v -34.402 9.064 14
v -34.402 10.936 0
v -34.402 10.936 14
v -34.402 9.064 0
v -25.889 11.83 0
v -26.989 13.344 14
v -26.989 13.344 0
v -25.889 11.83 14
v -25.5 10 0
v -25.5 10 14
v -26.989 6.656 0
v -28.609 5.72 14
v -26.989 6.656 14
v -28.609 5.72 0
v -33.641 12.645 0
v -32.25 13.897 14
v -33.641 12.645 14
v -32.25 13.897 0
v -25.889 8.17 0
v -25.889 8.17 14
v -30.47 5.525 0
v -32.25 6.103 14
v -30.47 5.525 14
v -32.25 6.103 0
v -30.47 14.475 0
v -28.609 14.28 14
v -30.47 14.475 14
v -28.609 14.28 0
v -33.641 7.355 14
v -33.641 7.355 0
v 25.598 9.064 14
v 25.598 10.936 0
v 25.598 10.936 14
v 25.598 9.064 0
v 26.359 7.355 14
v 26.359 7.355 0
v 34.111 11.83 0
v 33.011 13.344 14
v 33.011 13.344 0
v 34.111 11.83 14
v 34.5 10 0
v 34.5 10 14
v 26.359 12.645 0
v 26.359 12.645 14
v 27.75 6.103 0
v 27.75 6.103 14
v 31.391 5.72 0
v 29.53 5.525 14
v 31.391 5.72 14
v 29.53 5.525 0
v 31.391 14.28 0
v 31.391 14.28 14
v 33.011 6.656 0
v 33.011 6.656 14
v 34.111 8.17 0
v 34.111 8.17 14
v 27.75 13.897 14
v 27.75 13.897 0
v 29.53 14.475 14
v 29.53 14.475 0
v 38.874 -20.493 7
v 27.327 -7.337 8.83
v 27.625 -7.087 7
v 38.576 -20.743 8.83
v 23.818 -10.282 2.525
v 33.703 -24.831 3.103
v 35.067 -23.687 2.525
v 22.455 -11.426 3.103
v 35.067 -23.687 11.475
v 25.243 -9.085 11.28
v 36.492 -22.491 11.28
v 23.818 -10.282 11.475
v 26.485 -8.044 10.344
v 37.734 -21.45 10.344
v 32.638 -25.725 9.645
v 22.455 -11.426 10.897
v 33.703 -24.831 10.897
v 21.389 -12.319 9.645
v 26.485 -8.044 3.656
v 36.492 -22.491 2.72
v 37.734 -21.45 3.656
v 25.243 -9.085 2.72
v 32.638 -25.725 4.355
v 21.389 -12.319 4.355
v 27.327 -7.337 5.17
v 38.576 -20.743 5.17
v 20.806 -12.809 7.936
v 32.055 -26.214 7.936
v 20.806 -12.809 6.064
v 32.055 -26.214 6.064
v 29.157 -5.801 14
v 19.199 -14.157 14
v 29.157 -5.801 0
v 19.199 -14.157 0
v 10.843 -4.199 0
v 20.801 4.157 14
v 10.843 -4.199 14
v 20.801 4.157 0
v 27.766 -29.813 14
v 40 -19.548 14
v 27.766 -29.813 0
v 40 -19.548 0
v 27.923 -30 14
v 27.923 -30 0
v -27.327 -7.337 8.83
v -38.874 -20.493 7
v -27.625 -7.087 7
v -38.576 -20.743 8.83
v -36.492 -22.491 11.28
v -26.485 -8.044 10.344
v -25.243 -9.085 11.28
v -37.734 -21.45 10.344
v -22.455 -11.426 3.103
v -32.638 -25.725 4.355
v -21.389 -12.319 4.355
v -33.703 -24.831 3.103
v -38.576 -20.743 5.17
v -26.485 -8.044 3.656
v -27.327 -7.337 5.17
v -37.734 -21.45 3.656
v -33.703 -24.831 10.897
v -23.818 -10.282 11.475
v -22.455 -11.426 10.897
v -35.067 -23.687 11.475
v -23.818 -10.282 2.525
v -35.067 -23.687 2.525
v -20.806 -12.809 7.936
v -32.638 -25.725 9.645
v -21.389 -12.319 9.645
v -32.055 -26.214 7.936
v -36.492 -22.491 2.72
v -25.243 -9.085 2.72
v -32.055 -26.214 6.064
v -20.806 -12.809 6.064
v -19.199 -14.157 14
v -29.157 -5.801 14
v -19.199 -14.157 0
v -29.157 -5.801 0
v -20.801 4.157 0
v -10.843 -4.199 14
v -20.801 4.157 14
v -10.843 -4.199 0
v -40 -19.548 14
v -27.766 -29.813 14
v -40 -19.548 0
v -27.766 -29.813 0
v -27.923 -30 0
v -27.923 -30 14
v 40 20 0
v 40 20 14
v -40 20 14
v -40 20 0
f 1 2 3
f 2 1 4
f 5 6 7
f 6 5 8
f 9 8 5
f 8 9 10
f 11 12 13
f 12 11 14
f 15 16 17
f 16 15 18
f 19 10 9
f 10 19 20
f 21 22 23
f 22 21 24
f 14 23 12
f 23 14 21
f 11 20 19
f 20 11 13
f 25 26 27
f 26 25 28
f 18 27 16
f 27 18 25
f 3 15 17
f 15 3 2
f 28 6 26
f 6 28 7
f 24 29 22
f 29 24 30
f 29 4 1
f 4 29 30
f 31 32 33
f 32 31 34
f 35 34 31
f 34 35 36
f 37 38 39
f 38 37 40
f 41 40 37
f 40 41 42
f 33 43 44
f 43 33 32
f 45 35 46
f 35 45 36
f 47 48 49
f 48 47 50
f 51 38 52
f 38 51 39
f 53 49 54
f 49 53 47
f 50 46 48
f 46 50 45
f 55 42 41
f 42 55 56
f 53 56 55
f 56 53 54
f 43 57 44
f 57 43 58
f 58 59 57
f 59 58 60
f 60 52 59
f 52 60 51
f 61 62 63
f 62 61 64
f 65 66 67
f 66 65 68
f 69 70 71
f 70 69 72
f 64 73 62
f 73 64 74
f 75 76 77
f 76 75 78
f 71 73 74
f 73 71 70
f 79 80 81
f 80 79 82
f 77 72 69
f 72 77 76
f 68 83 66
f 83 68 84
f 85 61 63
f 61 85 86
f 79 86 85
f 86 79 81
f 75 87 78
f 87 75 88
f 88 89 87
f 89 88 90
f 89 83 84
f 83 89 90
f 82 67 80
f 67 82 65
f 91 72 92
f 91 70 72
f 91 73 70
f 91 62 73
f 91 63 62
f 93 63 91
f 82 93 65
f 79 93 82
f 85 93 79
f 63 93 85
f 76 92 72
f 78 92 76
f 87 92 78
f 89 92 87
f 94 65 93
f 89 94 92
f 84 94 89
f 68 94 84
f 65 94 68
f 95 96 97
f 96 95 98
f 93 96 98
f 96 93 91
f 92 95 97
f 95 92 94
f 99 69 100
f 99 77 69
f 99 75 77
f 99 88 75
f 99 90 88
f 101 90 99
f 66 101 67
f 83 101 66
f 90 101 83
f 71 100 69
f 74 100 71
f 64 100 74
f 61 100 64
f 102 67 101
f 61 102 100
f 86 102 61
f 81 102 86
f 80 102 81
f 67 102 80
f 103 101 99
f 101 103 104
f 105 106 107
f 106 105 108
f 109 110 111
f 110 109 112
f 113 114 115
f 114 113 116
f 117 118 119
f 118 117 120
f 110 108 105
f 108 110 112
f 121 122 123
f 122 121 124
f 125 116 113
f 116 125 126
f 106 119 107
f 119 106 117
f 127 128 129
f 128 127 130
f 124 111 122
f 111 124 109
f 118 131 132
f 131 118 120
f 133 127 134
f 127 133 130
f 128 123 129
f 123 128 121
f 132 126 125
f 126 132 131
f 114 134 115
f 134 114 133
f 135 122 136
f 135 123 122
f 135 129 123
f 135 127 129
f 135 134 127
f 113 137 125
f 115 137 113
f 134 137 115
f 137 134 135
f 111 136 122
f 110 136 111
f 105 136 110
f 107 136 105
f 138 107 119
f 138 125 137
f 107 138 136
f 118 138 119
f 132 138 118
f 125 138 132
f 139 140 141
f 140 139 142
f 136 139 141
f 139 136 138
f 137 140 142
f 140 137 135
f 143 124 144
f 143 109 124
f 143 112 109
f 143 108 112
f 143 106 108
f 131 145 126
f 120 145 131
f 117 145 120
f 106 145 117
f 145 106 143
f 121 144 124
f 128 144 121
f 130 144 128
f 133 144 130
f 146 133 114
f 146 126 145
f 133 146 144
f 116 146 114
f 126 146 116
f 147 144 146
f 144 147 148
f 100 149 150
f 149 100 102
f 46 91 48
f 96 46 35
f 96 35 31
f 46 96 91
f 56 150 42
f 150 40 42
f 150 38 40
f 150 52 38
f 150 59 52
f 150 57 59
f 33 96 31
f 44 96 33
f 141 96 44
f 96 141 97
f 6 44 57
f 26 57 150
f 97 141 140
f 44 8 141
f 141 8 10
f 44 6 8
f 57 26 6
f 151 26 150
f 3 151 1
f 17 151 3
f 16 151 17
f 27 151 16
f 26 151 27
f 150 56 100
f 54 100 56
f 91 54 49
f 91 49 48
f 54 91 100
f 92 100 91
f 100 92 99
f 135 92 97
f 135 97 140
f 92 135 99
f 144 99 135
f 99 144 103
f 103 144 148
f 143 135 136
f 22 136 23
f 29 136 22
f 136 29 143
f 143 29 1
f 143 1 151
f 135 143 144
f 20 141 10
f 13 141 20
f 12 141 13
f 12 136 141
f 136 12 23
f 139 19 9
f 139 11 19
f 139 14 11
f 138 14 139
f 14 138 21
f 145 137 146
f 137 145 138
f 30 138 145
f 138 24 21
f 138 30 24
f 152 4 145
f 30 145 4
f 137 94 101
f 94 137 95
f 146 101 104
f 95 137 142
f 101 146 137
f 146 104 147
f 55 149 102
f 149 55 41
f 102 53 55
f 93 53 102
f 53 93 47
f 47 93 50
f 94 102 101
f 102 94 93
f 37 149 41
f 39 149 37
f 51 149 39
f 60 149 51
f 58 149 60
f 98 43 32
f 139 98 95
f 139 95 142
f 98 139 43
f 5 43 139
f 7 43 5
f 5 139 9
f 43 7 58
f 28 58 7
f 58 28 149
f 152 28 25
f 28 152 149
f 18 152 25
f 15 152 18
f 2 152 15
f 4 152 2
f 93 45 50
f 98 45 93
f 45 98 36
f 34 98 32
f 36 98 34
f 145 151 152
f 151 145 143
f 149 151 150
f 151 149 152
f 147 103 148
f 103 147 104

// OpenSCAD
e = 5;
h = 45;
a = 50;

l = 60;

module coin(){
    difference(){

        union(){
            
            translate([-10,-30,0]) cube([20,60,e]);
            hull(){
                translate([-10,-10,0]) cube([20,20,h]);
                translate([0,0,h]) rotate([0,90-a,0]) translate([0,0,-15])cube([20,20,40], center = true);
            }
        }
        
        translate([0,0,h]) rotate([0,90-a,0]) cylinder(r=4.5,100, center=true);
        
        for(i = [-1,1]){
            translate([0, i*20, -1]) cylinder(r=4.5,e+2);
        }
        translate([20, 30,-1]) cylinder(r=5,e+2);
        
        translate([-15, -20,-1]) cylinder(r=4.5,e+2);
        translate([ 15, -20,-1]) cylinder(r=4.5,e+2);
    }
    %translate([ -20, -40,-40]) cube([40,80,40]);
}

module coin_h(){
    h2 = 14;
    l_coin = l+20;
    x = 20;
    difference(){

        union(){
            translate([-l_coin/2,-30,0]) cube([l_coin,50,h2]);
        }
        for(i = [-1,1]){
            translate([i*l/2, 10, -1]) cylinder(r=4.5,h2+2);
        }
        
        for(i = [0,1]){
            mirror([i,0,0])translate([x,-5, h2/2]) rotate([90,0,90-a]) cylinder(r=4.5,100);
            mirror([i,0,0])translate([x,-5, h2/2]) rotate([00,0,-a]) cube([13, 13, h2+20],center=true);
            mirror([i,0,0])translate([x,-5, h2/2]) rotate([00,0,-a]) translate([30,0,0]) cube([12,20,h2+20],center=true);
        }
    }
}

module camera(){
    h2 = 14;
    l_camera = 60;
    r = 6;
    difference(){

        union(){
            translate([-l/2,-l_camera/2,0]) cube([l,l_camera,2]);
            for(i = [0,1]){
                mirror([i,0,0])hull(){
                    translate([l/2,l_camera/2,r]) rotate([90,0,0]) cylinder(r=r, l_camera);
                    translate([l/2-r,-l_camera/2]) cube([r*2, l_camera, 1]);
                }
            }
            
            for(i = [-1,1]){
                for(j = [-1,1]){
                    translate([i*14, j*14, 0]) cylinder(r=4, 2+3);
                }
            }
        }
        for(i = [-1,1]){
            translate([i*l/2, l_camera/2+1, r]) rotate([90,0,0]) cylinder(r=4.2, l_camera+2);
        }
        
        for(i = [-1,1]){
            for(j = [-1,1]){
                translate([i*14, j*14, -1]) cylinder(r=2, l_camera+2);
                translate([i*14, j*25, -1]) cylinder(r=2, l_camera+2);
            }
        }
        
        cube([20,20, 10], center = true);
        cube([5,25, 10], center = true);
    }
}

module all(){
    lg = 450;
    l = 600;
    for(j=[0,1]){
        for(i=[0,1]){
            mirror([0,j,0])mirror([i,0,0]) translate([-lg/2,l/2,0])coin();
            mirror([0,j,0]) mirror([i,0,0]) translate([-lg/2,l/2,0])translate([0,0,h]) rotate([0,90-a,0])%cylinder(r=4,500);
        }
         mirror([0,j,0])translate([0,l/2,450]) rotate([90,0,0])coin_h();
    }
    
}

mode = 2;
if(mode == 0){
    all();
} else if(mode == 1){
    coin();
} else if(mode == 2){
    coin_h();
} else if(mode == 3){
    camera();
}
